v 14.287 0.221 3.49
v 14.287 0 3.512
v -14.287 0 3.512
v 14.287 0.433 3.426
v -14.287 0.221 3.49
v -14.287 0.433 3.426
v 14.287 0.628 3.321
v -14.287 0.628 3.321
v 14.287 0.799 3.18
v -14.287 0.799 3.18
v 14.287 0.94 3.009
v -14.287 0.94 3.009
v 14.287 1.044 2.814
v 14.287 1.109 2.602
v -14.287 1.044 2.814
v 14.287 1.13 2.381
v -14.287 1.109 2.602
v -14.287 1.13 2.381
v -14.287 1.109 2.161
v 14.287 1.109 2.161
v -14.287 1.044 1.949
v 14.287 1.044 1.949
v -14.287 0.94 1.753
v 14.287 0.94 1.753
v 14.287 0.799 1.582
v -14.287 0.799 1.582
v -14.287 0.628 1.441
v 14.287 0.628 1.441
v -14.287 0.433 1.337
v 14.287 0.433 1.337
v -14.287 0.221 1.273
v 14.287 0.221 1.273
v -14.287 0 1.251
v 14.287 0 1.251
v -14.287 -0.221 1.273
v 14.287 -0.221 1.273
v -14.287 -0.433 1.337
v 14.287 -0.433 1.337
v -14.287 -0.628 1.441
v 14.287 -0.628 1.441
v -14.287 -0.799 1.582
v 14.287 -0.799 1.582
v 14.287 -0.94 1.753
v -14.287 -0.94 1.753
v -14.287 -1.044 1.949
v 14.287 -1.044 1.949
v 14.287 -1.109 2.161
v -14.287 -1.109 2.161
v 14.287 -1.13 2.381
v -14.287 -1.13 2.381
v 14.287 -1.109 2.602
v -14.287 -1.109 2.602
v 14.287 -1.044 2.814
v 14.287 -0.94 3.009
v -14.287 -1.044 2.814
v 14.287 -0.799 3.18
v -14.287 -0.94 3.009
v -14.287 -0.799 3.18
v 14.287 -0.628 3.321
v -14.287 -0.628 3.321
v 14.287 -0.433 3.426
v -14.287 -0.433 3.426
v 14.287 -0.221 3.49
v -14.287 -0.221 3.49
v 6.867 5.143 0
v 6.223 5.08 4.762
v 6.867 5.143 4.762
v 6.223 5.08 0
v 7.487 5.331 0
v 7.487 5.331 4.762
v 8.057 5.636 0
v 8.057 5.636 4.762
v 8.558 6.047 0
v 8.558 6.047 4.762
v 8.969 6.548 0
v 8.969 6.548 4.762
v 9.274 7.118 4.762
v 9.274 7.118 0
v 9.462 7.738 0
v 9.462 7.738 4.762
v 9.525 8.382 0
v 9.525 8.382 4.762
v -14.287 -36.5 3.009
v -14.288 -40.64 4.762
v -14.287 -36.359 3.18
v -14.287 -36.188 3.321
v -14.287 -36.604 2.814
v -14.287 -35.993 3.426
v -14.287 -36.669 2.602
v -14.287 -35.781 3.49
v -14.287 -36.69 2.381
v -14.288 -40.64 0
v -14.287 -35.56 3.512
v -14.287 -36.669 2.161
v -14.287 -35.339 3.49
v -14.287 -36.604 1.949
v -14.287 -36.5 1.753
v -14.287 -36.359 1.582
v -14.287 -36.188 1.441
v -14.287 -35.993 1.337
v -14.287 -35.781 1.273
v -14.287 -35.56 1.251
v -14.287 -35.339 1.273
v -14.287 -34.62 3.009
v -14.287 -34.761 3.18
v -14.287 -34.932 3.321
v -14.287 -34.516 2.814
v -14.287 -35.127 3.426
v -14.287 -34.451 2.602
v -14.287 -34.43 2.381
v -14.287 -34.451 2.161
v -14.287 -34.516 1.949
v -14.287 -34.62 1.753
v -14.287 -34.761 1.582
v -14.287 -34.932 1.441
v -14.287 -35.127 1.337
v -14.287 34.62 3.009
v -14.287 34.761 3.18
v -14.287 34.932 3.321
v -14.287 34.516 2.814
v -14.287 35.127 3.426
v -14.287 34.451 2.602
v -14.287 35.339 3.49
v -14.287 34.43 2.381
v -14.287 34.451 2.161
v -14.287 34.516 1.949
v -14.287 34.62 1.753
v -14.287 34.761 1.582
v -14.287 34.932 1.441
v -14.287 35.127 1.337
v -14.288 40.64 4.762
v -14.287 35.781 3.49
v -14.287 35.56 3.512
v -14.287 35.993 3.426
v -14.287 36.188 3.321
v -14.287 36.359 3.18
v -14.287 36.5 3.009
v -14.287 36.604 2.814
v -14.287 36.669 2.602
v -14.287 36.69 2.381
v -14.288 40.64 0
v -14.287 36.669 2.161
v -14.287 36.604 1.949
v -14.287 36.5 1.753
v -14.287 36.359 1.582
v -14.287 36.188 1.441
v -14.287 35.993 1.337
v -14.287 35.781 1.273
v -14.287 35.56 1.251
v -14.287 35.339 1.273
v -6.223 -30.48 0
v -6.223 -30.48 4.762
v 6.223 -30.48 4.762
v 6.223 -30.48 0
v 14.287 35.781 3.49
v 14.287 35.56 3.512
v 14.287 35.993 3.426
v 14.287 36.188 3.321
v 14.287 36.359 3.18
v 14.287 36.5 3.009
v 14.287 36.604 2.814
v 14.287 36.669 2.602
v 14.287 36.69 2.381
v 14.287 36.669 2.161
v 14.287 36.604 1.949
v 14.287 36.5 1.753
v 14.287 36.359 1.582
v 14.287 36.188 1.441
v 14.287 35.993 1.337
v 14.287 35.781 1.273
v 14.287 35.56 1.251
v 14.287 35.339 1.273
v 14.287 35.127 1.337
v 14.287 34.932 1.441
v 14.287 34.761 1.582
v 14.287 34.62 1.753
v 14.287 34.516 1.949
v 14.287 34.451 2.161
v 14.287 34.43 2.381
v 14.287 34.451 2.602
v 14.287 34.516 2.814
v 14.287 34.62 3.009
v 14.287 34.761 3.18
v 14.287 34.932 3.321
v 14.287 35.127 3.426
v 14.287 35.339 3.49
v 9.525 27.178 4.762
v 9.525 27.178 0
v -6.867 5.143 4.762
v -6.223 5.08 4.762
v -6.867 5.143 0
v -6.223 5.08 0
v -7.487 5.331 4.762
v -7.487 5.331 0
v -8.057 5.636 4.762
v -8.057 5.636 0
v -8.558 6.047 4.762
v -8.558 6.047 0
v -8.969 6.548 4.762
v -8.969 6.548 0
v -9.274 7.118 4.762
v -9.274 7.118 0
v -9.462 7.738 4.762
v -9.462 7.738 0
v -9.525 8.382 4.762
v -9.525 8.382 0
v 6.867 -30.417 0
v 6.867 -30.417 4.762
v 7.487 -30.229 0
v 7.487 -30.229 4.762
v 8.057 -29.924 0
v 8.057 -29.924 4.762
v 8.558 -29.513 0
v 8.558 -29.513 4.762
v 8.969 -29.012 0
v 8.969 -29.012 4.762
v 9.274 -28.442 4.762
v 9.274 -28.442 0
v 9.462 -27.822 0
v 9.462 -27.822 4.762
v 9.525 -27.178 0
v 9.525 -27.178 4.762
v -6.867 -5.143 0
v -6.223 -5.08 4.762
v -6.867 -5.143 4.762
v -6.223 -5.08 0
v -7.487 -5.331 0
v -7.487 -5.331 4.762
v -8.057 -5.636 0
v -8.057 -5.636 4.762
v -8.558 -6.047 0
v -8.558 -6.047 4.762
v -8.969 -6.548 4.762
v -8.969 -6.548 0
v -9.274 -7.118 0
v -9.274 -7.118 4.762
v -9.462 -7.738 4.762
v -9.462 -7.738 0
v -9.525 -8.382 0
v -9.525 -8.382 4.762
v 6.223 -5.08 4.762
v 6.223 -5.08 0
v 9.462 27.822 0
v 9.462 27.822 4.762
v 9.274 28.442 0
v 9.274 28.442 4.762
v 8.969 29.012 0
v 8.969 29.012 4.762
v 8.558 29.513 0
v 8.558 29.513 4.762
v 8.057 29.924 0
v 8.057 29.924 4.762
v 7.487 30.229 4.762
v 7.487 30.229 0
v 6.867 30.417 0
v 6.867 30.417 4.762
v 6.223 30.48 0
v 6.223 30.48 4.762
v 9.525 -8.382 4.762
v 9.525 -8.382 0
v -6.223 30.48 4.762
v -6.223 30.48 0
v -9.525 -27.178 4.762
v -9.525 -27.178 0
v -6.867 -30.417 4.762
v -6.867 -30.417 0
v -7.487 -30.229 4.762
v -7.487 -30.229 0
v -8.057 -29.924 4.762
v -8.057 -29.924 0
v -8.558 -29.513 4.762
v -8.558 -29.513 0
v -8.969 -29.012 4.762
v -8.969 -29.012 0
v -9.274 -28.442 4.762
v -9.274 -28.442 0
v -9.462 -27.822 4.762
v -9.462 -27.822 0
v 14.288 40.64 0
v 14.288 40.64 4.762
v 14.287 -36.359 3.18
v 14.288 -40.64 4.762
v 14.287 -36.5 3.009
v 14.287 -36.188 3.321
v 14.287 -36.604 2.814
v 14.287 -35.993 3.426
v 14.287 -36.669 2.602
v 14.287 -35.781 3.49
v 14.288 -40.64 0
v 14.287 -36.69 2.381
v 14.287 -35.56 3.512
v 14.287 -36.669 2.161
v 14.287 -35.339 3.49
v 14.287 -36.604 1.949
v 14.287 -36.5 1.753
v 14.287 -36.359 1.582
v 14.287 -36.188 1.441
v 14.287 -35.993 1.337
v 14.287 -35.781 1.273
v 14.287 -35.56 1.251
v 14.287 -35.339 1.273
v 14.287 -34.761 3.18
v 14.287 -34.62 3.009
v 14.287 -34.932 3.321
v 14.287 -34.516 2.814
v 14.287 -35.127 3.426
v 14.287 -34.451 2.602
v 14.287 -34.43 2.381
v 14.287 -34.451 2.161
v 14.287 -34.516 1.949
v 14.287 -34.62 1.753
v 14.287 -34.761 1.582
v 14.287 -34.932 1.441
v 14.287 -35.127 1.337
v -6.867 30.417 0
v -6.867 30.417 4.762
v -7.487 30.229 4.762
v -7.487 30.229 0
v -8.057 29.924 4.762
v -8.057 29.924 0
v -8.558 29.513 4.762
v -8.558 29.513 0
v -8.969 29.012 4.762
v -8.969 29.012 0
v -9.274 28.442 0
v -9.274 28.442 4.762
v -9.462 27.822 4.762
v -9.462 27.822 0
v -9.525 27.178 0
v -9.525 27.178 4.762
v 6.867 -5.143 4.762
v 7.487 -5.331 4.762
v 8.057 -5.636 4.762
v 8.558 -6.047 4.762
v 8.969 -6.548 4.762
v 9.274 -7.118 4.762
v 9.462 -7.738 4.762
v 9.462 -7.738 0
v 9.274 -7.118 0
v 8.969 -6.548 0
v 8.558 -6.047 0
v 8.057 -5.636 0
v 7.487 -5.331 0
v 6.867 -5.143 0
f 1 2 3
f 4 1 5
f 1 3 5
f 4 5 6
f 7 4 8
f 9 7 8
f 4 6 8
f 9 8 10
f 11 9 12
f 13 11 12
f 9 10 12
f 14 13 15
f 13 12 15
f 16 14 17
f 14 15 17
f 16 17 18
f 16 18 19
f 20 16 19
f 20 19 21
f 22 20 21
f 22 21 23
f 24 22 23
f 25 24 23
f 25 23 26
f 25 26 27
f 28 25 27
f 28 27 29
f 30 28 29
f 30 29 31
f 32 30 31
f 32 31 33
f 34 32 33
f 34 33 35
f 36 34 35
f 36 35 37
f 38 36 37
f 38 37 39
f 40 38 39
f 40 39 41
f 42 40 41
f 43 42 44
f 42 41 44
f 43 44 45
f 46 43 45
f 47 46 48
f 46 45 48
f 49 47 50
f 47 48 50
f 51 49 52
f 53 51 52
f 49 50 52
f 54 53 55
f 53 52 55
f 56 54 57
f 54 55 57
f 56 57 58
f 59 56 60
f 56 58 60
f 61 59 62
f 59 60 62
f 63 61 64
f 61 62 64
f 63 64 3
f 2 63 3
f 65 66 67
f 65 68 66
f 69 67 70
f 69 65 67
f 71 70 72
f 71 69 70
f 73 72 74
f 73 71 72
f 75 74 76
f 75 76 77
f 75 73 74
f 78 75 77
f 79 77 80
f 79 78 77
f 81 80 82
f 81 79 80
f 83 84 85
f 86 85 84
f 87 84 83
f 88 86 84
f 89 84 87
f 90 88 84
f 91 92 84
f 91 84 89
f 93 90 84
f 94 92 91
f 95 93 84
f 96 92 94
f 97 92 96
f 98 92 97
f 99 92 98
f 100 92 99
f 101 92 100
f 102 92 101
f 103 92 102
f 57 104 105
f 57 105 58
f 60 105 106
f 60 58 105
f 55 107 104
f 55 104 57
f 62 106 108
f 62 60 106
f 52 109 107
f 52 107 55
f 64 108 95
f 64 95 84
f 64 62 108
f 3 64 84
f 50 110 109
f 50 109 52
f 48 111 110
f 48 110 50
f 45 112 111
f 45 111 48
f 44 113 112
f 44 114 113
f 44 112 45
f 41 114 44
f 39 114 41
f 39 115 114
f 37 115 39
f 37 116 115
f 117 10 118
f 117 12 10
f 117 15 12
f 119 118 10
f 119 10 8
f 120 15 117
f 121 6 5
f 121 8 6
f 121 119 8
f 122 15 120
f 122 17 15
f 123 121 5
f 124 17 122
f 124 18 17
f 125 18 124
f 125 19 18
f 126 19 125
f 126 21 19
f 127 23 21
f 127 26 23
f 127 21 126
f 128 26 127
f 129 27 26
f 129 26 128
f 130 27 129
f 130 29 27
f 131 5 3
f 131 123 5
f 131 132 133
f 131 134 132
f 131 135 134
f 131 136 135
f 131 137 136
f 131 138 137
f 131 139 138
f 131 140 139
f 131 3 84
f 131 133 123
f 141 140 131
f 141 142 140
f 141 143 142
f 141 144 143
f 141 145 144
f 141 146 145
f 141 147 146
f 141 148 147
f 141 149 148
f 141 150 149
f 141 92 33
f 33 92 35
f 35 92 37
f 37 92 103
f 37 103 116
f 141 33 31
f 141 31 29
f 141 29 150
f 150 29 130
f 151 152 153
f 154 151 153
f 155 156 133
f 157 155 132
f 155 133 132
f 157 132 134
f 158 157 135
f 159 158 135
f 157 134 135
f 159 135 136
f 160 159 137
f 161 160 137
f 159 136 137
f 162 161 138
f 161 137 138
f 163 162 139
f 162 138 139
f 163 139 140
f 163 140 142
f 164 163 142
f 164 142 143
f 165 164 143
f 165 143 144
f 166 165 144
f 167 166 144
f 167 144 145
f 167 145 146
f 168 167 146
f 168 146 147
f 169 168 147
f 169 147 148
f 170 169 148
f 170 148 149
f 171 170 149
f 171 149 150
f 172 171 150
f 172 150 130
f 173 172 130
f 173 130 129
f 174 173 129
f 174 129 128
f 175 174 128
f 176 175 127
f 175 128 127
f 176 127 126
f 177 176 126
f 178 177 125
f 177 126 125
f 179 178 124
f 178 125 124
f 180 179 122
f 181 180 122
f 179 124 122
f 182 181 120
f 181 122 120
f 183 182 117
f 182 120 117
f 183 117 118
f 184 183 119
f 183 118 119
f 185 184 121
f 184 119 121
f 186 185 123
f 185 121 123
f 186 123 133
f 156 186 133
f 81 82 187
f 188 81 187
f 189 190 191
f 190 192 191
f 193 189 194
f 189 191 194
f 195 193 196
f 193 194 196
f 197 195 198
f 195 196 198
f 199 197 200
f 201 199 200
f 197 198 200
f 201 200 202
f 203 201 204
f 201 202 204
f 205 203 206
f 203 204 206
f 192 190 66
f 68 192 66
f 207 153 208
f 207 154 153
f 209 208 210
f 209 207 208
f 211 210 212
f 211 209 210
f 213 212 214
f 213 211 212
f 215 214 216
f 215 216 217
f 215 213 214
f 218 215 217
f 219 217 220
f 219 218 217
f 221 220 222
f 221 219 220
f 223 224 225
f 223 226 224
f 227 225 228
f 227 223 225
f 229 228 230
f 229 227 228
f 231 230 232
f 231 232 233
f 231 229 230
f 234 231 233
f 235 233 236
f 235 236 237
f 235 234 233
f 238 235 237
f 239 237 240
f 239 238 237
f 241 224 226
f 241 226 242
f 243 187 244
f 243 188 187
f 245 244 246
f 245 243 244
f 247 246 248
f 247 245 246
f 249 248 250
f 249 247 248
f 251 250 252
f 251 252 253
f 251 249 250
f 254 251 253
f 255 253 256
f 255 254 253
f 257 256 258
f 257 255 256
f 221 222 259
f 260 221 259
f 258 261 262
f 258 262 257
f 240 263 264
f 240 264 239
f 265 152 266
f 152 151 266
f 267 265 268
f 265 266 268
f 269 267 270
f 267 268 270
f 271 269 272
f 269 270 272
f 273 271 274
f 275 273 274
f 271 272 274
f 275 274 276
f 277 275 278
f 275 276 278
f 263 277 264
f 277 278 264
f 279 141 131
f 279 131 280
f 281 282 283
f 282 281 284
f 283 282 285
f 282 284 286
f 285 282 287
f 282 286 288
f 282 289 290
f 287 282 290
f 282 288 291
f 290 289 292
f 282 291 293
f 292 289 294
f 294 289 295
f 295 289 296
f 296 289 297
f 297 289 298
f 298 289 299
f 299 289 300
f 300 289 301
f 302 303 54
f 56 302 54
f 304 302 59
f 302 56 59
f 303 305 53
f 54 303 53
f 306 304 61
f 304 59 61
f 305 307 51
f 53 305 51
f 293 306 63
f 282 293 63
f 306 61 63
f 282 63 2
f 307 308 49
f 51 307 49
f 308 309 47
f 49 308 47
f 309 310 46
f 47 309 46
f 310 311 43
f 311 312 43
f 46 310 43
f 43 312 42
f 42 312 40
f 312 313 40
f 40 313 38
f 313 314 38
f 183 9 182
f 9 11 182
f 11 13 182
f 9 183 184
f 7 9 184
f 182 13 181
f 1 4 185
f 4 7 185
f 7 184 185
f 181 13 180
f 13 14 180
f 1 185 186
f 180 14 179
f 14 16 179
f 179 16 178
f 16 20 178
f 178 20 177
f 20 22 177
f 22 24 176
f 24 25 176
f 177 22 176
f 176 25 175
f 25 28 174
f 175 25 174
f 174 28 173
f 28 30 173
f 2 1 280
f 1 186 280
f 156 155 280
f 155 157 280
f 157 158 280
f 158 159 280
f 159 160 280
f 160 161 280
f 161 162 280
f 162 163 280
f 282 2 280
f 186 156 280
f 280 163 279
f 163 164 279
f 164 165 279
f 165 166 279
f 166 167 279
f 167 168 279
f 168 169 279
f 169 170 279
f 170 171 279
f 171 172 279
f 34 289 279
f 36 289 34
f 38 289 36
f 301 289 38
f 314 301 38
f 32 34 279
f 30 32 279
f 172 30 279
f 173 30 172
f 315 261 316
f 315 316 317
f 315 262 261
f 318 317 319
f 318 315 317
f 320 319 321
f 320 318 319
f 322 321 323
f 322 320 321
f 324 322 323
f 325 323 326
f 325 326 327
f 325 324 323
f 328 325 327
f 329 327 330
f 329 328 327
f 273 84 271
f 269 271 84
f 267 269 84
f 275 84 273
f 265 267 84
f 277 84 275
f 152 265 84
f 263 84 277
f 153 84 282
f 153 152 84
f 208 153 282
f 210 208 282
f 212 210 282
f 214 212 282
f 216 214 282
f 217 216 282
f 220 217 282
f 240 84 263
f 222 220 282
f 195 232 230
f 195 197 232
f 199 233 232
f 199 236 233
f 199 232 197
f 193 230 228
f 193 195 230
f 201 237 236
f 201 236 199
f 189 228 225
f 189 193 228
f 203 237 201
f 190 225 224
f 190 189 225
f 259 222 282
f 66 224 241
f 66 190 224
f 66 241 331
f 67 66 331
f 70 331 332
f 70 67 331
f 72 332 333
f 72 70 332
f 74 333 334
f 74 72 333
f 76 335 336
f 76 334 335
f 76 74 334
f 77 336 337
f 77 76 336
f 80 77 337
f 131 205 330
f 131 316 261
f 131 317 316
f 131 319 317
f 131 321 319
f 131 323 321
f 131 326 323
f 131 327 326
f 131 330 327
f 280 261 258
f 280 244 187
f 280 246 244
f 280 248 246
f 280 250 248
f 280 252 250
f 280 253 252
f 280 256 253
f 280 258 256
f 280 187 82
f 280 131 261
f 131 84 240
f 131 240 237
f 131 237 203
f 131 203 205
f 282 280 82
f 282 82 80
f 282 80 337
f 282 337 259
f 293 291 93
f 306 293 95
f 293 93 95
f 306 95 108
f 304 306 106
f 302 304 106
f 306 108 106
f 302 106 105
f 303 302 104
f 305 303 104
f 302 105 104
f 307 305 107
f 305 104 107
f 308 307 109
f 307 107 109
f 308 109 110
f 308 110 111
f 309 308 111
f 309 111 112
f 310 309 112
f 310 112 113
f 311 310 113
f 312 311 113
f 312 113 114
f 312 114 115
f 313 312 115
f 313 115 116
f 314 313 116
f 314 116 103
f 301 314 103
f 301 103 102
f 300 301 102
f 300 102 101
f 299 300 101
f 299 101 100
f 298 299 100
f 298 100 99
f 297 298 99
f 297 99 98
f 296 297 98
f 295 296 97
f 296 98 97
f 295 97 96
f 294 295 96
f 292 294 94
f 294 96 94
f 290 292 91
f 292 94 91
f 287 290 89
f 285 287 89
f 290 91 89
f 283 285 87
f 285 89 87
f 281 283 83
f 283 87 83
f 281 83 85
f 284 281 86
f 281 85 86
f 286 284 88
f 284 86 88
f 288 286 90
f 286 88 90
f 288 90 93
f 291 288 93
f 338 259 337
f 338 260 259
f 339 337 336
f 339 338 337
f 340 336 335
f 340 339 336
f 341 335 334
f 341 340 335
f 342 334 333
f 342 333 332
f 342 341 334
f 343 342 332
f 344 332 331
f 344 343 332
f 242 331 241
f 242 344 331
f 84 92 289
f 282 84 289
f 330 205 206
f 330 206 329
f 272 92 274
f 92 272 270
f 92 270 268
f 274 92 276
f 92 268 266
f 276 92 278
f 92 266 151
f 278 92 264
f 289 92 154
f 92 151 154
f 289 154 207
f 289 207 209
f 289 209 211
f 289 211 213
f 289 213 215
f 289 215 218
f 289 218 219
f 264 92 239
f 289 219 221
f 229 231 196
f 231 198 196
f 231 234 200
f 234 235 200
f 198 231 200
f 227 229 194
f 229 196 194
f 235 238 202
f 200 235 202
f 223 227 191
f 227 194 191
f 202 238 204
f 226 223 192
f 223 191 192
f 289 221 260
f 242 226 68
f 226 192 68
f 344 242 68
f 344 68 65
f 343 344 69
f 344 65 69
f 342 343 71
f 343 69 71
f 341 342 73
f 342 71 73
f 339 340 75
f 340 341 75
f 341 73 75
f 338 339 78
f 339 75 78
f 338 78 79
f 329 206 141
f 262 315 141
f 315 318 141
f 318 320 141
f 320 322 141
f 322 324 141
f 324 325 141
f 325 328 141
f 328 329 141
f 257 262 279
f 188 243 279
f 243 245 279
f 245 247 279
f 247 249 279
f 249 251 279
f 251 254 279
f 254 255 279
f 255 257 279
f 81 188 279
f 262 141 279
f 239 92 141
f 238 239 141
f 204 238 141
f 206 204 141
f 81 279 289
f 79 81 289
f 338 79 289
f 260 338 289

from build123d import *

# Parameters (mm, degrees)
SKETCH1_W             = 28.575
SKETCH1_H             = 81.28
BOSS_EXTRUDE1_DEPTH   = 4.7625
SKETCH2_W             = 19.05
SKETCH2_H             = 25.4
CUT_EXTRUDE1_DEPTH    = 44.340785209
FILLET1_R             = 3.302
F_4_40_TAPPED_HOLE1_D = 2.2606


with BuildPart() as part:
    # Sketch1 → Boss-Extrude1 (new body)
    with BuildSketch(Plane.XY):
        Rectangle(SKETCH1_W, SKETCH1_H)
    extrude(amount=BOSS_EXTRUDE1_DEPTH)

    # Sketch2 → Cut-Extrude1 (cut, through all)
    with BuildSketch(Plane.XY.offset(4.7625)):
        with Locations((0, 17.78)):
            Rectangle(SKETCH2_W, SKETCH2_H)
        with Locations((0, -17.78)):
            Rectangle(SKETCH2_W, SKETCH2_H)
    extrude(amount=-CUT_EXTRUDE1_DEPTH, mode=Mode.SUBTRACT)

    # Fillet1
    fillet1_edges = [part.edges().sort_by_distance(p)[0] for p in [
        (9.525, 30.48, 2.38125),
        (9.525, 5.08, 2.38125),
        (-9.525, 5.08, 2.38125),
        (-9.525, 30.48, 2.38125),
        (-9.525, -30.48, 2.38125),
        (-9.525, -5.08, 2.38125),
        (9.525, -5.08, 2.38125),
        (9.525, -30.48, 2.38125),
    ]]
    fillet(fillet1_edges, radius=FILLET1_R)

    # #4-40 Tapped Hole1 (through all)
    with Locations(Plane(origin=(14.2875, 0, 0), x_dir=(0, 0, -1), z_dir=(1, 0, 0))):
        with Locations((-2.38125, 35.56), (-2.38125, 0), (-2.38125, -35.56)):
            Hole(F_4_40_TAPPED_HOLE1_D / 2)


solid = part.part
